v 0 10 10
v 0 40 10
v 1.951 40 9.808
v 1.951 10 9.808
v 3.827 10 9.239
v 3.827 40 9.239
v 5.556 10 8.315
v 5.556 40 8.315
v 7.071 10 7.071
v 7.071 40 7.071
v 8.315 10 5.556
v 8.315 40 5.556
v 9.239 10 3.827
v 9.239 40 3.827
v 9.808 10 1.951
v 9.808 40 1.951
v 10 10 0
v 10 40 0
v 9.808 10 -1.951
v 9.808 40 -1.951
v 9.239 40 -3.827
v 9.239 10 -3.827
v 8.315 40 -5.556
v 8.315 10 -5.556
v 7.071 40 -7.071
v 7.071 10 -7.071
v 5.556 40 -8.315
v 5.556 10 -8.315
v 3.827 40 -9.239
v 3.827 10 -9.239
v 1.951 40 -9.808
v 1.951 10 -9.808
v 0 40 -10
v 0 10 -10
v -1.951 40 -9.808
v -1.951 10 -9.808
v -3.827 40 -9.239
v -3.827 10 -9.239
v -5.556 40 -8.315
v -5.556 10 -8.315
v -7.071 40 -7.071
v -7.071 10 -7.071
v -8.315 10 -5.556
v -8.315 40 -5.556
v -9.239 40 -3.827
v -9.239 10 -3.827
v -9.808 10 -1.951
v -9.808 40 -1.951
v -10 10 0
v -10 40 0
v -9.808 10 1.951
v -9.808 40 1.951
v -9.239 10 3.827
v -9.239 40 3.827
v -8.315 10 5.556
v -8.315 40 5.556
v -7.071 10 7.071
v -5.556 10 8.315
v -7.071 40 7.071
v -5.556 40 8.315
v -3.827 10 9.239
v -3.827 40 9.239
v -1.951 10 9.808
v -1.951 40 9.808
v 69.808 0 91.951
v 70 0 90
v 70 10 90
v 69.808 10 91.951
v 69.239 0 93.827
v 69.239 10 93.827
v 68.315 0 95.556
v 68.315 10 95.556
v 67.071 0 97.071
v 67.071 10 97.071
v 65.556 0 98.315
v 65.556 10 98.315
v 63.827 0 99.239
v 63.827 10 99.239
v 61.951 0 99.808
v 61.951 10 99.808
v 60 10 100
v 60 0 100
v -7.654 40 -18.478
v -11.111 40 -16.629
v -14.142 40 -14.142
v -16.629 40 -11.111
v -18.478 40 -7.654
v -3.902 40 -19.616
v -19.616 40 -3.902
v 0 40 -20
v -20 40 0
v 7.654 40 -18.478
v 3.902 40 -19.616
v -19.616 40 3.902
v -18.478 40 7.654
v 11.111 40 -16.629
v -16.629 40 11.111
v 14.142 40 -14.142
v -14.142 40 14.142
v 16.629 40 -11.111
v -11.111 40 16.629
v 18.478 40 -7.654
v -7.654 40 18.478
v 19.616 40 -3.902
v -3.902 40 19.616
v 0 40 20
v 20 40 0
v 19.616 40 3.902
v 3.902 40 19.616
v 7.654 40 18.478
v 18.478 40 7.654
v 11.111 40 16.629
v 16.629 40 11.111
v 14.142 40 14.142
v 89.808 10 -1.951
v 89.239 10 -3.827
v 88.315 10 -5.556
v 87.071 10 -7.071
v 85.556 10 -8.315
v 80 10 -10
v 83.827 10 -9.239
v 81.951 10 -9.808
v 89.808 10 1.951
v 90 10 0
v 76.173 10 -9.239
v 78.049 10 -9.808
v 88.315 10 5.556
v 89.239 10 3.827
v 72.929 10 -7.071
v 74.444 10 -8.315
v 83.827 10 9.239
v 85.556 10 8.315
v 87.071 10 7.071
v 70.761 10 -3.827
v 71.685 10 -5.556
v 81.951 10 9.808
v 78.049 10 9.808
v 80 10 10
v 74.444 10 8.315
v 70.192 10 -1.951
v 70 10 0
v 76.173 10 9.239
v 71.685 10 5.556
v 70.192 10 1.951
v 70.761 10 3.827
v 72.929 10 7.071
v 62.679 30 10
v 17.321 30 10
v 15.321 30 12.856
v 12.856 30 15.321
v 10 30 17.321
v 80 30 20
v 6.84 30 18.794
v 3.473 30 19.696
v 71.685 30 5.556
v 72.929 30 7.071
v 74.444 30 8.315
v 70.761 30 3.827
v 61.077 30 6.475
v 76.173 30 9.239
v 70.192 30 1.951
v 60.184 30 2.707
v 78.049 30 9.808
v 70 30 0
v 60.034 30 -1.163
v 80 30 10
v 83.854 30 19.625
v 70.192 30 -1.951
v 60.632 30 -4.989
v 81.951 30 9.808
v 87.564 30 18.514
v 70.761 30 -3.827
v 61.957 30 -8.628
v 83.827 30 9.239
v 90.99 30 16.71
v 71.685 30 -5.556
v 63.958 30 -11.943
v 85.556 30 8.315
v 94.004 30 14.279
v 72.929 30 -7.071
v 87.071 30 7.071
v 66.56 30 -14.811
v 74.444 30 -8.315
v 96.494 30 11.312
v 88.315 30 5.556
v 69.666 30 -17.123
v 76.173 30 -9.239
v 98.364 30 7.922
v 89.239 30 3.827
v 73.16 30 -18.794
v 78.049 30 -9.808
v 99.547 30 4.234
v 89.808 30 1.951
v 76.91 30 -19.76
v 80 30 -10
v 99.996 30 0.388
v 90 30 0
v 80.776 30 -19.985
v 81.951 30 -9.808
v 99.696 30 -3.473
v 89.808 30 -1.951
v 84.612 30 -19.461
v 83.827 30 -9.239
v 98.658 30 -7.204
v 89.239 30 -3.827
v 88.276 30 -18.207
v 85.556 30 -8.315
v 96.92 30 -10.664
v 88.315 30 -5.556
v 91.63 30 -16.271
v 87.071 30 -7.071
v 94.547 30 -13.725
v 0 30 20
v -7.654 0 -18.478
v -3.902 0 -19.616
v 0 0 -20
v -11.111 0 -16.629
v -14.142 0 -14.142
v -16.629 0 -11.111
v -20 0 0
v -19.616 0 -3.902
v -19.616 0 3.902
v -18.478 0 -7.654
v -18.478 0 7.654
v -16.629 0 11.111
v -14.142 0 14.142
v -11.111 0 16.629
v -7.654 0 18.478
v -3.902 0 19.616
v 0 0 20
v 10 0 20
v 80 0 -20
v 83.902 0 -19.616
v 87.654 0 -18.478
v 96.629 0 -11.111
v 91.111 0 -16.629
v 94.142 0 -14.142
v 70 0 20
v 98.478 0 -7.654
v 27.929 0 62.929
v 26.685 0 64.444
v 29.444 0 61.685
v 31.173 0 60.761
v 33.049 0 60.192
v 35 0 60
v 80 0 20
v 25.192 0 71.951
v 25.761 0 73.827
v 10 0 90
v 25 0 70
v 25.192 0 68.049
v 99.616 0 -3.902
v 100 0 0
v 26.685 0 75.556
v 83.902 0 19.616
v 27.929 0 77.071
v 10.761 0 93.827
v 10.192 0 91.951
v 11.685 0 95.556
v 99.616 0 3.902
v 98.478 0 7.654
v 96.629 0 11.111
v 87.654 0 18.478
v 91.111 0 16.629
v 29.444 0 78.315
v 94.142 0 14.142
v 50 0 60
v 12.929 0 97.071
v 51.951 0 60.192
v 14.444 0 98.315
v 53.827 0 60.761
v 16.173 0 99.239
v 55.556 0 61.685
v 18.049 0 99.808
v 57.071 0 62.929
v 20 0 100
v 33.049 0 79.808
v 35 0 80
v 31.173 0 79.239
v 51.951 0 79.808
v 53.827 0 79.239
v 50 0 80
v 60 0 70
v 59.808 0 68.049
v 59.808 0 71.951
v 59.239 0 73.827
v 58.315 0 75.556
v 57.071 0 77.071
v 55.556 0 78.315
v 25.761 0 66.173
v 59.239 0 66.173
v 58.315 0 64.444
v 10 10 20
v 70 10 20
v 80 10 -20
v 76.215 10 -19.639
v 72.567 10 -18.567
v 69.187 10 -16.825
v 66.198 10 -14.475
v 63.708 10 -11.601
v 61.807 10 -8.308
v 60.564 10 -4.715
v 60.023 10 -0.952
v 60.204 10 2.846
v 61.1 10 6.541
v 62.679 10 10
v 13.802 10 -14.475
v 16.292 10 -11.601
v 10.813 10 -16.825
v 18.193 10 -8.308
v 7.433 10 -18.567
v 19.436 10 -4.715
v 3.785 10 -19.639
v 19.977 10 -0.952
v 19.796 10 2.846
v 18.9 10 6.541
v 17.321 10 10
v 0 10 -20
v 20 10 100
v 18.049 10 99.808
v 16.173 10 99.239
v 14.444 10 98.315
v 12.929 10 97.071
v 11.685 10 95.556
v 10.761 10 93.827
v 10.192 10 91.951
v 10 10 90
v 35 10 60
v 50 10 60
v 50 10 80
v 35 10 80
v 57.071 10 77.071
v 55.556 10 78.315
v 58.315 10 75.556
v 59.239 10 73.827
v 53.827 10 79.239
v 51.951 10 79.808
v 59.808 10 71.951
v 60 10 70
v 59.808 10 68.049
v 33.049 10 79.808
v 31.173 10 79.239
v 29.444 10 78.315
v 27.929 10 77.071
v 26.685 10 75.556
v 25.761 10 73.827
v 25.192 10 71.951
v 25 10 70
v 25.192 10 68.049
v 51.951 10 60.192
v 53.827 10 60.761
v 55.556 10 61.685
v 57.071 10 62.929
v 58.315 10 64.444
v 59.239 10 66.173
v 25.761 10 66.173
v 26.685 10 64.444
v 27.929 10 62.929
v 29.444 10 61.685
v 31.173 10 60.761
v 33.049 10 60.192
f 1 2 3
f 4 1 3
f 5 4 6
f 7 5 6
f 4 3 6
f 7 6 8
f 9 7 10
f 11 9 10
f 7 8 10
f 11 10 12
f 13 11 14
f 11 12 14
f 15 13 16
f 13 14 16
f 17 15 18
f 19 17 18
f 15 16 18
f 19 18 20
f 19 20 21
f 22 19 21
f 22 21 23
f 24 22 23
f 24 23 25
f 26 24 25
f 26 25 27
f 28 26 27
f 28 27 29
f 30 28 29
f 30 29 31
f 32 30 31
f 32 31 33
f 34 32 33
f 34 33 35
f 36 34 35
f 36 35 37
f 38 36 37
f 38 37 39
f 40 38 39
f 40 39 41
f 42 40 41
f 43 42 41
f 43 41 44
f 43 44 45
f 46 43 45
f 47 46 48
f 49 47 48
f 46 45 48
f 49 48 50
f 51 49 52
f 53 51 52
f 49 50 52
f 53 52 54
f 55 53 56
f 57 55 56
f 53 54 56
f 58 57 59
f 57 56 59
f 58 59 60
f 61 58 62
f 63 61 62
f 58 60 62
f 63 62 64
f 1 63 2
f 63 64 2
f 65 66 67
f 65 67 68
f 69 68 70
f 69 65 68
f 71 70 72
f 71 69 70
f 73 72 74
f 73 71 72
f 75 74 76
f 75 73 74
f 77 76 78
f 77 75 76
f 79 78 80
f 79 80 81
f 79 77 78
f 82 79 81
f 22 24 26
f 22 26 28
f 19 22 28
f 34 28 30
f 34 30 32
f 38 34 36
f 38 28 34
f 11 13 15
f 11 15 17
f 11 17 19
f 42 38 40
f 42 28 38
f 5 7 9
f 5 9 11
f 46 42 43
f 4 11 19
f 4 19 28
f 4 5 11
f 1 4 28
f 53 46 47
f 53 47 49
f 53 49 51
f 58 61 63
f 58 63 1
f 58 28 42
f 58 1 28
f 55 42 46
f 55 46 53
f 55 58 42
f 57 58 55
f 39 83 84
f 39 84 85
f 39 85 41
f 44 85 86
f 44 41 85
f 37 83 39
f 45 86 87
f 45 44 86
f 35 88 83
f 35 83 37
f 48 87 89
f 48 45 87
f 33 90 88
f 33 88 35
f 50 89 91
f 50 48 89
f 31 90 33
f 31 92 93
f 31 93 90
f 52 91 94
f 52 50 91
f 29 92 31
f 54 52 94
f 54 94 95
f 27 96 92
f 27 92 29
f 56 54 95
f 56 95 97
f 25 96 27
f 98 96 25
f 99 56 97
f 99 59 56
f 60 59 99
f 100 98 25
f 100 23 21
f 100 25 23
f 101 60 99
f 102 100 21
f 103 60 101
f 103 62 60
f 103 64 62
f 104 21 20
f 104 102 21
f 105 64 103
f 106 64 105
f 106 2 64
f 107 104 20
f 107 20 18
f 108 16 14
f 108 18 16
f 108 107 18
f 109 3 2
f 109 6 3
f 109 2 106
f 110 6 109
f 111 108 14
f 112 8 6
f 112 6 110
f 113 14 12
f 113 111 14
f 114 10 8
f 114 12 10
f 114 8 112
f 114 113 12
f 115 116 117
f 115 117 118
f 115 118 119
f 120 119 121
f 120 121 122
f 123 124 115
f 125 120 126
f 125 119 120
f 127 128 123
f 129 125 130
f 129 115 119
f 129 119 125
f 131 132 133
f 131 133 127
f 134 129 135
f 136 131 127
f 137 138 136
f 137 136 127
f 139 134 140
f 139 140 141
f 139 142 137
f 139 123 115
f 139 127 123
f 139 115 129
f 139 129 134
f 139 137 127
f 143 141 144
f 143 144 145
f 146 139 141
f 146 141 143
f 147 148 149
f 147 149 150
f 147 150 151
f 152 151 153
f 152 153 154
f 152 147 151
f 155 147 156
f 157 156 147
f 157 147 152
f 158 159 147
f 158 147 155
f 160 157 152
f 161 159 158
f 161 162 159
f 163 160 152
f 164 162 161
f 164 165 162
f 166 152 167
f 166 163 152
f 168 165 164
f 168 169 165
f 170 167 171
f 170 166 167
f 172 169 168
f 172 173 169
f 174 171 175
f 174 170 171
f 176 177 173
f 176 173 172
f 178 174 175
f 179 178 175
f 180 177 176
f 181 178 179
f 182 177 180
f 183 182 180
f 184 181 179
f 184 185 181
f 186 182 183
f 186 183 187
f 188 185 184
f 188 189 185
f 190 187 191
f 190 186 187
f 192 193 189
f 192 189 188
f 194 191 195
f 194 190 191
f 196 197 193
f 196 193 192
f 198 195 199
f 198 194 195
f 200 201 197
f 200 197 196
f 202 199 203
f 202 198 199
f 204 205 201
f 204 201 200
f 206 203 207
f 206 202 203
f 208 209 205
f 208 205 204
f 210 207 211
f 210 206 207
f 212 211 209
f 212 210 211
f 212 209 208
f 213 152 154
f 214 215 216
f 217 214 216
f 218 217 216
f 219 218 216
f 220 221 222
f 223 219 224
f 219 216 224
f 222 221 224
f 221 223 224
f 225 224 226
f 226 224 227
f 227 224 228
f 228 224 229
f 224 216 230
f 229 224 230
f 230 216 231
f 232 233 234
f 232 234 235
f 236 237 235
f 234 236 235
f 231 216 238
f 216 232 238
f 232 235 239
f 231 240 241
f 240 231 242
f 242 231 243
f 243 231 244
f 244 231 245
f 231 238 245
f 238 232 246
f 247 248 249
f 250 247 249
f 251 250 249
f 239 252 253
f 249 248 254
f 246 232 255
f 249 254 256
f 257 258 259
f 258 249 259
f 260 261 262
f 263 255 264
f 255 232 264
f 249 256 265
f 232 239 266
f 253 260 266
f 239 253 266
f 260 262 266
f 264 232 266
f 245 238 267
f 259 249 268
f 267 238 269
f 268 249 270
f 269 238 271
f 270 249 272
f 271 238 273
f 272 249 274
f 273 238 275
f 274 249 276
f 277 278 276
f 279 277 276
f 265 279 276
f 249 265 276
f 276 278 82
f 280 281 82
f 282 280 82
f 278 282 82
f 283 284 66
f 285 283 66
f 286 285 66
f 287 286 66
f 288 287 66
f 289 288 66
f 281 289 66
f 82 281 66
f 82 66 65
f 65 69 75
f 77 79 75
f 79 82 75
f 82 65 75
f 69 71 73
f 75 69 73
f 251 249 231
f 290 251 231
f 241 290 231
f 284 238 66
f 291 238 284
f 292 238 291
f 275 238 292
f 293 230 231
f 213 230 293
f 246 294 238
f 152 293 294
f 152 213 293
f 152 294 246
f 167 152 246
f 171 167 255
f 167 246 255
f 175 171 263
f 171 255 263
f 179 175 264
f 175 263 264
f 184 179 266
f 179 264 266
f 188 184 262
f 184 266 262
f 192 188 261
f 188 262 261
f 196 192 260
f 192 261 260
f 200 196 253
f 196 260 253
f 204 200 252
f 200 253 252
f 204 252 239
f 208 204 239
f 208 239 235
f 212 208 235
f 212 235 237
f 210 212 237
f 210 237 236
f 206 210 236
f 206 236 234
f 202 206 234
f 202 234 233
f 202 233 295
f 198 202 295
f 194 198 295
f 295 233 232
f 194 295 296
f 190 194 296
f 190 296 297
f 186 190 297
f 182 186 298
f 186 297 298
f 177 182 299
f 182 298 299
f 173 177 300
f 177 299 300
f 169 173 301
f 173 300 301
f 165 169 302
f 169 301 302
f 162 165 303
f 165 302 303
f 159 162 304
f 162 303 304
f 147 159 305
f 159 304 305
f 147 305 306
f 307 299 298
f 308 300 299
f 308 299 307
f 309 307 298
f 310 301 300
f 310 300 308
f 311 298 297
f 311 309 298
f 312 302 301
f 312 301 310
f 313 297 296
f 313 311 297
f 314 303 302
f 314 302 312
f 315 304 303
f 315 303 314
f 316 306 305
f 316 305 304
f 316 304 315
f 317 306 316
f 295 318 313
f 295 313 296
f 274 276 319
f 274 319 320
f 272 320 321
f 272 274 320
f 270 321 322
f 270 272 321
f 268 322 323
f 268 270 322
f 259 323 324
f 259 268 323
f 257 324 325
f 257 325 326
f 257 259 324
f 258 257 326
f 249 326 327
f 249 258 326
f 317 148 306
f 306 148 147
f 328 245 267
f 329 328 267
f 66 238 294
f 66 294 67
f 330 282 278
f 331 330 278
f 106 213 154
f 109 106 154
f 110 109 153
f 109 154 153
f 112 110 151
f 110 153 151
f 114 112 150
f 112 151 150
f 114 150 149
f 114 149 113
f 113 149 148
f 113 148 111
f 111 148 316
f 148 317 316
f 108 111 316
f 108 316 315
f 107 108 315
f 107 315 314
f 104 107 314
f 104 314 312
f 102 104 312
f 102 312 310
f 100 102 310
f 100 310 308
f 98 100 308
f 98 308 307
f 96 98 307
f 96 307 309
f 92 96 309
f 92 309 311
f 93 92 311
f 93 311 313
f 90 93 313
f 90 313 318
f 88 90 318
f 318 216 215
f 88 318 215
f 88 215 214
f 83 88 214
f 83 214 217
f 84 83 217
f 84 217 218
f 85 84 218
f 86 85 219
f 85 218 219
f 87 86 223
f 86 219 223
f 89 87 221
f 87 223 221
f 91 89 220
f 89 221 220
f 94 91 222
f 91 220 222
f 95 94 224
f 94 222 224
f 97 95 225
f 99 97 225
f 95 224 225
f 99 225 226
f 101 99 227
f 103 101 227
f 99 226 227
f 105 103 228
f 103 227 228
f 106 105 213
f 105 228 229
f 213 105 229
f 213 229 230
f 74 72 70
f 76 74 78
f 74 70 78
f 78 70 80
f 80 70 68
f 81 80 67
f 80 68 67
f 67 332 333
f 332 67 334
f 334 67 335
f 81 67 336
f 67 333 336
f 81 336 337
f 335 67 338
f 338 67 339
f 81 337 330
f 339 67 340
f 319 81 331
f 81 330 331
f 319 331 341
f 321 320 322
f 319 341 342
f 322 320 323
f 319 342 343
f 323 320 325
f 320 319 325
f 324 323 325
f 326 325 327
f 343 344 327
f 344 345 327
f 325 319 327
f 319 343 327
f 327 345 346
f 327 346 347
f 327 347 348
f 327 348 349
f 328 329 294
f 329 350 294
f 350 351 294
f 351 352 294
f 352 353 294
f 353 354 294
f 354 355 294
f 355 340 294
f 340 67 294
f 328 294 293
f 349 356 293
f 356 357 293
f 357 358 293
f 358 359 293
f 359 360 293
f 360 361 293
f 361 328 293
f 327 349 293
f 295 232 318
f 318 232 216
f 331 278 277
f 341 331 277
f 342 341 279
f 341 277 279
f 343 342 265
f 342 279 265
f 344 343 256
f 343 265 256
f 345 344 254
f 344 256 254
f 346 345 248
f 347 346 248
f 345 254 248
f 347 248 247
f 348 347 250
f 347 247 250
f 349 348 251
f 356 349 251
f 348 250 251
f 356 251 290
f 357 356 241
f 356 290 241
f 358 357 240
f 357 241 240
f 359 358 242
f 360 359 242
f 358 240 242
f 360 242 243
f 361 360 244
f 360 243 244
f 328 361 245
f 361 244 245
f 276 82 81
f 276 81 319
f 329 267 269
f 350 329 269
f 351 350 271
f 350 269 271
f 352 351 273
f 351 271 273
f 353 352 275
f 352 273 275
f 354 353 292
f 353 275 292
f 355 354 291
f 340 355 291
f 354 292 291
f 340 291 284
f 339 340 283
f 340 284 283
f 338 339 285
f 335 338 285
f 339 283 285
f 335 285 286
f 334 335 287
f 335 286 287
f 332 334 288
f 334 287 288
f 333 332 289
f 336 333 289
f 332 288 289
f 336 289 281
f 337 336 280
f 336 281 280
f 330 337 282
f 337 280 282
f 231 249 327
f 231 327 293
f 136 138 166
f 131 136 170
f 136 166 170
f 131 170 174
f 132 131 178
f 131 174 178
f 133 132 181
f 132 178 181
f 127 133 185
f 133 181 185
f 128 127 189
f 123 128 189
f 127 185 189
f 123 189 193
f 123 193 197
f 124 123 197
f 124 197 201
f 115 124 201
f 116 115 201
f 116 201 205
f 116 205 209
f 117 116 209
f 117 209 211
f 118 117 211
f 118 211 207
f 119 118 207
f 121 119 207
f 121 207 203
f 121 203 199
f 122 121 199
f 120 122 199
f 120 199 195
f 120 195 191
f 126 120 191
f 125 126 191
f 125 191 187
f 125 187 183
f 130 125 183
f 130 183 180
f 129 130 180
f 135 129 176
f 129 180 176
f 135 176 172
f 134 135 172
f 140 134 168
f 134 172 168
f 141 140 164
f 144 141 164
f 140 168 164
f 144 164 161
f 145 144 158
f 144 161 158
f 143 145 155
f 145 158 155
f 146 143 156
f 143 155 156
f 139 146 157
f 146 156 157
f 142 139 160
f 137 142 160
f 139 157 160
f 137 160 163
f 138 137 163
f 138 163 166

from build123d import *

# Parameters (mm, degrees)
SKETCH1_R           = 20
BOSS_EXTRUDE1_DEPTH = 40
SKETCH2_R           = 10
CUT_EXTRUDE1_DEPTH  = 49.989794856
SKETCH3_R           = 20
BOSS_EXTRUDE2_DEPTH = 30
SKETCH4_R           = 10
CUT_EXTRUDE2_DEPTH  = 107.301458127
SKETCH5_W           = 80
SKETCH5_H           = 10
BOSS_EXTRUDE3_DEPTH = 30
BOSS_EXTRUDE4_DEPTH = 10
BOSS_EXTRUDE5_DEPTH = 10


with BuildPart() as part:
    # Sketch1 → Boss-Extrude1 (new body)
    with BuildSketch(Plane(origin=(0, 0, 0), x_dir=(1, 0, 0), z_dir=(0, 1, 0))):
        with Locations(Location((0, 0, 0), (0, 0, 270))):
            Circle(SKETCH1_R)
    extrude(amount=BOSS_EXTRUDE1_DEPTH)

    # Sketch2 → Cut-Extrude1 (cut, through all)
    with BuildSketch(Plane(origin=(0, 40, 0), x_dir=(1, 0, 0), z_dir=(0, 1, 0))):
        with Locations(Location((0, 0, 0), (0, 0, 270))):
            Circle(SKETCH2_R)
    extrude(amount=-CUT_EXTRUDE1_DEPTH, mode=Mode.SUBTRACT)



with BuildPart() as body_2:
    # Sketch3 → Boss-Extrude2 (new body)
    with BuildSketch(Plane(origin=(0, 0, 0), x_dir=(1, 0, 0), z_dir=(0, 1, 0))):
        with Locations(Location((80, 0, 0), (0, 0, 270))):
            Circle(SKETCH3_R)
    extrude(amount=BOSS_EXTRUDE2_DEPTH)

    # Sketch4 → Cut-Extrude2 (cut, through all)
    with BuildSketch(Plane(origin=(0, 30, 0), x_dir=(1, 0, 0), z_dir=(0, 1, 0))):
        with Locations(Location((80, 0, 0), (0, 0, 270))):
            Circle(SKETCH4_R)
    extrude(amount=-CUT_EXTRUDE2_DEPTH, mode=Mode.SUBTRACT)


with BuildPart() as part_1:
    add(part.part)

    add(body_2.part)  # Boss-Extrude3 merges body 2
    # Sketch5 → Boss-Extrude3 (add)
    with BuildSketch(Plane(origin=(0, 30, 0), x_dir=(1, 0, 0), z_dir=(0, 1, 0))):
        with Locations((40, -15)):
            Rectangle(SKETCH5_W, SKETCH5_H)
    extrude(amount=-BOSS_EXTRUDE3_DEPTH)

    # Sketch6 → Boss-Extrude4 (add)
    with BuildSketch(Plane.XZ):
        with BuildLine():
            Line((0, 20), (80, 20))
            ThreePointArc((80, 20), (100, 0), (80, -20))
            Line((80, -20), (0, -20))
            ThreePointArc((0, -20), (-20, 0), (0, 20))
        make_face()
    extrude(amount=-BOSS_EXTRUDE4_DEPTH)

    # Sketch7 → Boss-Extrude5 (add)
    with BuildSketch(Plane(origin=(0, 0, 0), x_dir=(1, 0, 0), z_dir=(0, 1, 0))):
        with BuildLine():
            Line((10, -20), (70, -20))
            Line((70, -20), (70, -90))
            ThreePointArc((70, -90), (67.071067812, -97.071067812), (60, -100))
            Line((60, -100), (20, -100))
            ThreePointArc((20, -100), (12.928932188, -97.071067812), (10, -90))
            Line((10, -90), (10, -20))
        make_face()
        with BuildLine():
            Line((35, -60), (50, -60))
            ThreePointArc((50, -60), (60, -70), (50, -80))
            Line((50, -80), (35, -80))
            ThreePointArc((35, -80), (25, -70), (35, -60))
        make_face(mode=Mode.SUBTRACT)
    extrude(amount=BOSS_EXTRUDE5_DEPTH)


solid = part_1.part
